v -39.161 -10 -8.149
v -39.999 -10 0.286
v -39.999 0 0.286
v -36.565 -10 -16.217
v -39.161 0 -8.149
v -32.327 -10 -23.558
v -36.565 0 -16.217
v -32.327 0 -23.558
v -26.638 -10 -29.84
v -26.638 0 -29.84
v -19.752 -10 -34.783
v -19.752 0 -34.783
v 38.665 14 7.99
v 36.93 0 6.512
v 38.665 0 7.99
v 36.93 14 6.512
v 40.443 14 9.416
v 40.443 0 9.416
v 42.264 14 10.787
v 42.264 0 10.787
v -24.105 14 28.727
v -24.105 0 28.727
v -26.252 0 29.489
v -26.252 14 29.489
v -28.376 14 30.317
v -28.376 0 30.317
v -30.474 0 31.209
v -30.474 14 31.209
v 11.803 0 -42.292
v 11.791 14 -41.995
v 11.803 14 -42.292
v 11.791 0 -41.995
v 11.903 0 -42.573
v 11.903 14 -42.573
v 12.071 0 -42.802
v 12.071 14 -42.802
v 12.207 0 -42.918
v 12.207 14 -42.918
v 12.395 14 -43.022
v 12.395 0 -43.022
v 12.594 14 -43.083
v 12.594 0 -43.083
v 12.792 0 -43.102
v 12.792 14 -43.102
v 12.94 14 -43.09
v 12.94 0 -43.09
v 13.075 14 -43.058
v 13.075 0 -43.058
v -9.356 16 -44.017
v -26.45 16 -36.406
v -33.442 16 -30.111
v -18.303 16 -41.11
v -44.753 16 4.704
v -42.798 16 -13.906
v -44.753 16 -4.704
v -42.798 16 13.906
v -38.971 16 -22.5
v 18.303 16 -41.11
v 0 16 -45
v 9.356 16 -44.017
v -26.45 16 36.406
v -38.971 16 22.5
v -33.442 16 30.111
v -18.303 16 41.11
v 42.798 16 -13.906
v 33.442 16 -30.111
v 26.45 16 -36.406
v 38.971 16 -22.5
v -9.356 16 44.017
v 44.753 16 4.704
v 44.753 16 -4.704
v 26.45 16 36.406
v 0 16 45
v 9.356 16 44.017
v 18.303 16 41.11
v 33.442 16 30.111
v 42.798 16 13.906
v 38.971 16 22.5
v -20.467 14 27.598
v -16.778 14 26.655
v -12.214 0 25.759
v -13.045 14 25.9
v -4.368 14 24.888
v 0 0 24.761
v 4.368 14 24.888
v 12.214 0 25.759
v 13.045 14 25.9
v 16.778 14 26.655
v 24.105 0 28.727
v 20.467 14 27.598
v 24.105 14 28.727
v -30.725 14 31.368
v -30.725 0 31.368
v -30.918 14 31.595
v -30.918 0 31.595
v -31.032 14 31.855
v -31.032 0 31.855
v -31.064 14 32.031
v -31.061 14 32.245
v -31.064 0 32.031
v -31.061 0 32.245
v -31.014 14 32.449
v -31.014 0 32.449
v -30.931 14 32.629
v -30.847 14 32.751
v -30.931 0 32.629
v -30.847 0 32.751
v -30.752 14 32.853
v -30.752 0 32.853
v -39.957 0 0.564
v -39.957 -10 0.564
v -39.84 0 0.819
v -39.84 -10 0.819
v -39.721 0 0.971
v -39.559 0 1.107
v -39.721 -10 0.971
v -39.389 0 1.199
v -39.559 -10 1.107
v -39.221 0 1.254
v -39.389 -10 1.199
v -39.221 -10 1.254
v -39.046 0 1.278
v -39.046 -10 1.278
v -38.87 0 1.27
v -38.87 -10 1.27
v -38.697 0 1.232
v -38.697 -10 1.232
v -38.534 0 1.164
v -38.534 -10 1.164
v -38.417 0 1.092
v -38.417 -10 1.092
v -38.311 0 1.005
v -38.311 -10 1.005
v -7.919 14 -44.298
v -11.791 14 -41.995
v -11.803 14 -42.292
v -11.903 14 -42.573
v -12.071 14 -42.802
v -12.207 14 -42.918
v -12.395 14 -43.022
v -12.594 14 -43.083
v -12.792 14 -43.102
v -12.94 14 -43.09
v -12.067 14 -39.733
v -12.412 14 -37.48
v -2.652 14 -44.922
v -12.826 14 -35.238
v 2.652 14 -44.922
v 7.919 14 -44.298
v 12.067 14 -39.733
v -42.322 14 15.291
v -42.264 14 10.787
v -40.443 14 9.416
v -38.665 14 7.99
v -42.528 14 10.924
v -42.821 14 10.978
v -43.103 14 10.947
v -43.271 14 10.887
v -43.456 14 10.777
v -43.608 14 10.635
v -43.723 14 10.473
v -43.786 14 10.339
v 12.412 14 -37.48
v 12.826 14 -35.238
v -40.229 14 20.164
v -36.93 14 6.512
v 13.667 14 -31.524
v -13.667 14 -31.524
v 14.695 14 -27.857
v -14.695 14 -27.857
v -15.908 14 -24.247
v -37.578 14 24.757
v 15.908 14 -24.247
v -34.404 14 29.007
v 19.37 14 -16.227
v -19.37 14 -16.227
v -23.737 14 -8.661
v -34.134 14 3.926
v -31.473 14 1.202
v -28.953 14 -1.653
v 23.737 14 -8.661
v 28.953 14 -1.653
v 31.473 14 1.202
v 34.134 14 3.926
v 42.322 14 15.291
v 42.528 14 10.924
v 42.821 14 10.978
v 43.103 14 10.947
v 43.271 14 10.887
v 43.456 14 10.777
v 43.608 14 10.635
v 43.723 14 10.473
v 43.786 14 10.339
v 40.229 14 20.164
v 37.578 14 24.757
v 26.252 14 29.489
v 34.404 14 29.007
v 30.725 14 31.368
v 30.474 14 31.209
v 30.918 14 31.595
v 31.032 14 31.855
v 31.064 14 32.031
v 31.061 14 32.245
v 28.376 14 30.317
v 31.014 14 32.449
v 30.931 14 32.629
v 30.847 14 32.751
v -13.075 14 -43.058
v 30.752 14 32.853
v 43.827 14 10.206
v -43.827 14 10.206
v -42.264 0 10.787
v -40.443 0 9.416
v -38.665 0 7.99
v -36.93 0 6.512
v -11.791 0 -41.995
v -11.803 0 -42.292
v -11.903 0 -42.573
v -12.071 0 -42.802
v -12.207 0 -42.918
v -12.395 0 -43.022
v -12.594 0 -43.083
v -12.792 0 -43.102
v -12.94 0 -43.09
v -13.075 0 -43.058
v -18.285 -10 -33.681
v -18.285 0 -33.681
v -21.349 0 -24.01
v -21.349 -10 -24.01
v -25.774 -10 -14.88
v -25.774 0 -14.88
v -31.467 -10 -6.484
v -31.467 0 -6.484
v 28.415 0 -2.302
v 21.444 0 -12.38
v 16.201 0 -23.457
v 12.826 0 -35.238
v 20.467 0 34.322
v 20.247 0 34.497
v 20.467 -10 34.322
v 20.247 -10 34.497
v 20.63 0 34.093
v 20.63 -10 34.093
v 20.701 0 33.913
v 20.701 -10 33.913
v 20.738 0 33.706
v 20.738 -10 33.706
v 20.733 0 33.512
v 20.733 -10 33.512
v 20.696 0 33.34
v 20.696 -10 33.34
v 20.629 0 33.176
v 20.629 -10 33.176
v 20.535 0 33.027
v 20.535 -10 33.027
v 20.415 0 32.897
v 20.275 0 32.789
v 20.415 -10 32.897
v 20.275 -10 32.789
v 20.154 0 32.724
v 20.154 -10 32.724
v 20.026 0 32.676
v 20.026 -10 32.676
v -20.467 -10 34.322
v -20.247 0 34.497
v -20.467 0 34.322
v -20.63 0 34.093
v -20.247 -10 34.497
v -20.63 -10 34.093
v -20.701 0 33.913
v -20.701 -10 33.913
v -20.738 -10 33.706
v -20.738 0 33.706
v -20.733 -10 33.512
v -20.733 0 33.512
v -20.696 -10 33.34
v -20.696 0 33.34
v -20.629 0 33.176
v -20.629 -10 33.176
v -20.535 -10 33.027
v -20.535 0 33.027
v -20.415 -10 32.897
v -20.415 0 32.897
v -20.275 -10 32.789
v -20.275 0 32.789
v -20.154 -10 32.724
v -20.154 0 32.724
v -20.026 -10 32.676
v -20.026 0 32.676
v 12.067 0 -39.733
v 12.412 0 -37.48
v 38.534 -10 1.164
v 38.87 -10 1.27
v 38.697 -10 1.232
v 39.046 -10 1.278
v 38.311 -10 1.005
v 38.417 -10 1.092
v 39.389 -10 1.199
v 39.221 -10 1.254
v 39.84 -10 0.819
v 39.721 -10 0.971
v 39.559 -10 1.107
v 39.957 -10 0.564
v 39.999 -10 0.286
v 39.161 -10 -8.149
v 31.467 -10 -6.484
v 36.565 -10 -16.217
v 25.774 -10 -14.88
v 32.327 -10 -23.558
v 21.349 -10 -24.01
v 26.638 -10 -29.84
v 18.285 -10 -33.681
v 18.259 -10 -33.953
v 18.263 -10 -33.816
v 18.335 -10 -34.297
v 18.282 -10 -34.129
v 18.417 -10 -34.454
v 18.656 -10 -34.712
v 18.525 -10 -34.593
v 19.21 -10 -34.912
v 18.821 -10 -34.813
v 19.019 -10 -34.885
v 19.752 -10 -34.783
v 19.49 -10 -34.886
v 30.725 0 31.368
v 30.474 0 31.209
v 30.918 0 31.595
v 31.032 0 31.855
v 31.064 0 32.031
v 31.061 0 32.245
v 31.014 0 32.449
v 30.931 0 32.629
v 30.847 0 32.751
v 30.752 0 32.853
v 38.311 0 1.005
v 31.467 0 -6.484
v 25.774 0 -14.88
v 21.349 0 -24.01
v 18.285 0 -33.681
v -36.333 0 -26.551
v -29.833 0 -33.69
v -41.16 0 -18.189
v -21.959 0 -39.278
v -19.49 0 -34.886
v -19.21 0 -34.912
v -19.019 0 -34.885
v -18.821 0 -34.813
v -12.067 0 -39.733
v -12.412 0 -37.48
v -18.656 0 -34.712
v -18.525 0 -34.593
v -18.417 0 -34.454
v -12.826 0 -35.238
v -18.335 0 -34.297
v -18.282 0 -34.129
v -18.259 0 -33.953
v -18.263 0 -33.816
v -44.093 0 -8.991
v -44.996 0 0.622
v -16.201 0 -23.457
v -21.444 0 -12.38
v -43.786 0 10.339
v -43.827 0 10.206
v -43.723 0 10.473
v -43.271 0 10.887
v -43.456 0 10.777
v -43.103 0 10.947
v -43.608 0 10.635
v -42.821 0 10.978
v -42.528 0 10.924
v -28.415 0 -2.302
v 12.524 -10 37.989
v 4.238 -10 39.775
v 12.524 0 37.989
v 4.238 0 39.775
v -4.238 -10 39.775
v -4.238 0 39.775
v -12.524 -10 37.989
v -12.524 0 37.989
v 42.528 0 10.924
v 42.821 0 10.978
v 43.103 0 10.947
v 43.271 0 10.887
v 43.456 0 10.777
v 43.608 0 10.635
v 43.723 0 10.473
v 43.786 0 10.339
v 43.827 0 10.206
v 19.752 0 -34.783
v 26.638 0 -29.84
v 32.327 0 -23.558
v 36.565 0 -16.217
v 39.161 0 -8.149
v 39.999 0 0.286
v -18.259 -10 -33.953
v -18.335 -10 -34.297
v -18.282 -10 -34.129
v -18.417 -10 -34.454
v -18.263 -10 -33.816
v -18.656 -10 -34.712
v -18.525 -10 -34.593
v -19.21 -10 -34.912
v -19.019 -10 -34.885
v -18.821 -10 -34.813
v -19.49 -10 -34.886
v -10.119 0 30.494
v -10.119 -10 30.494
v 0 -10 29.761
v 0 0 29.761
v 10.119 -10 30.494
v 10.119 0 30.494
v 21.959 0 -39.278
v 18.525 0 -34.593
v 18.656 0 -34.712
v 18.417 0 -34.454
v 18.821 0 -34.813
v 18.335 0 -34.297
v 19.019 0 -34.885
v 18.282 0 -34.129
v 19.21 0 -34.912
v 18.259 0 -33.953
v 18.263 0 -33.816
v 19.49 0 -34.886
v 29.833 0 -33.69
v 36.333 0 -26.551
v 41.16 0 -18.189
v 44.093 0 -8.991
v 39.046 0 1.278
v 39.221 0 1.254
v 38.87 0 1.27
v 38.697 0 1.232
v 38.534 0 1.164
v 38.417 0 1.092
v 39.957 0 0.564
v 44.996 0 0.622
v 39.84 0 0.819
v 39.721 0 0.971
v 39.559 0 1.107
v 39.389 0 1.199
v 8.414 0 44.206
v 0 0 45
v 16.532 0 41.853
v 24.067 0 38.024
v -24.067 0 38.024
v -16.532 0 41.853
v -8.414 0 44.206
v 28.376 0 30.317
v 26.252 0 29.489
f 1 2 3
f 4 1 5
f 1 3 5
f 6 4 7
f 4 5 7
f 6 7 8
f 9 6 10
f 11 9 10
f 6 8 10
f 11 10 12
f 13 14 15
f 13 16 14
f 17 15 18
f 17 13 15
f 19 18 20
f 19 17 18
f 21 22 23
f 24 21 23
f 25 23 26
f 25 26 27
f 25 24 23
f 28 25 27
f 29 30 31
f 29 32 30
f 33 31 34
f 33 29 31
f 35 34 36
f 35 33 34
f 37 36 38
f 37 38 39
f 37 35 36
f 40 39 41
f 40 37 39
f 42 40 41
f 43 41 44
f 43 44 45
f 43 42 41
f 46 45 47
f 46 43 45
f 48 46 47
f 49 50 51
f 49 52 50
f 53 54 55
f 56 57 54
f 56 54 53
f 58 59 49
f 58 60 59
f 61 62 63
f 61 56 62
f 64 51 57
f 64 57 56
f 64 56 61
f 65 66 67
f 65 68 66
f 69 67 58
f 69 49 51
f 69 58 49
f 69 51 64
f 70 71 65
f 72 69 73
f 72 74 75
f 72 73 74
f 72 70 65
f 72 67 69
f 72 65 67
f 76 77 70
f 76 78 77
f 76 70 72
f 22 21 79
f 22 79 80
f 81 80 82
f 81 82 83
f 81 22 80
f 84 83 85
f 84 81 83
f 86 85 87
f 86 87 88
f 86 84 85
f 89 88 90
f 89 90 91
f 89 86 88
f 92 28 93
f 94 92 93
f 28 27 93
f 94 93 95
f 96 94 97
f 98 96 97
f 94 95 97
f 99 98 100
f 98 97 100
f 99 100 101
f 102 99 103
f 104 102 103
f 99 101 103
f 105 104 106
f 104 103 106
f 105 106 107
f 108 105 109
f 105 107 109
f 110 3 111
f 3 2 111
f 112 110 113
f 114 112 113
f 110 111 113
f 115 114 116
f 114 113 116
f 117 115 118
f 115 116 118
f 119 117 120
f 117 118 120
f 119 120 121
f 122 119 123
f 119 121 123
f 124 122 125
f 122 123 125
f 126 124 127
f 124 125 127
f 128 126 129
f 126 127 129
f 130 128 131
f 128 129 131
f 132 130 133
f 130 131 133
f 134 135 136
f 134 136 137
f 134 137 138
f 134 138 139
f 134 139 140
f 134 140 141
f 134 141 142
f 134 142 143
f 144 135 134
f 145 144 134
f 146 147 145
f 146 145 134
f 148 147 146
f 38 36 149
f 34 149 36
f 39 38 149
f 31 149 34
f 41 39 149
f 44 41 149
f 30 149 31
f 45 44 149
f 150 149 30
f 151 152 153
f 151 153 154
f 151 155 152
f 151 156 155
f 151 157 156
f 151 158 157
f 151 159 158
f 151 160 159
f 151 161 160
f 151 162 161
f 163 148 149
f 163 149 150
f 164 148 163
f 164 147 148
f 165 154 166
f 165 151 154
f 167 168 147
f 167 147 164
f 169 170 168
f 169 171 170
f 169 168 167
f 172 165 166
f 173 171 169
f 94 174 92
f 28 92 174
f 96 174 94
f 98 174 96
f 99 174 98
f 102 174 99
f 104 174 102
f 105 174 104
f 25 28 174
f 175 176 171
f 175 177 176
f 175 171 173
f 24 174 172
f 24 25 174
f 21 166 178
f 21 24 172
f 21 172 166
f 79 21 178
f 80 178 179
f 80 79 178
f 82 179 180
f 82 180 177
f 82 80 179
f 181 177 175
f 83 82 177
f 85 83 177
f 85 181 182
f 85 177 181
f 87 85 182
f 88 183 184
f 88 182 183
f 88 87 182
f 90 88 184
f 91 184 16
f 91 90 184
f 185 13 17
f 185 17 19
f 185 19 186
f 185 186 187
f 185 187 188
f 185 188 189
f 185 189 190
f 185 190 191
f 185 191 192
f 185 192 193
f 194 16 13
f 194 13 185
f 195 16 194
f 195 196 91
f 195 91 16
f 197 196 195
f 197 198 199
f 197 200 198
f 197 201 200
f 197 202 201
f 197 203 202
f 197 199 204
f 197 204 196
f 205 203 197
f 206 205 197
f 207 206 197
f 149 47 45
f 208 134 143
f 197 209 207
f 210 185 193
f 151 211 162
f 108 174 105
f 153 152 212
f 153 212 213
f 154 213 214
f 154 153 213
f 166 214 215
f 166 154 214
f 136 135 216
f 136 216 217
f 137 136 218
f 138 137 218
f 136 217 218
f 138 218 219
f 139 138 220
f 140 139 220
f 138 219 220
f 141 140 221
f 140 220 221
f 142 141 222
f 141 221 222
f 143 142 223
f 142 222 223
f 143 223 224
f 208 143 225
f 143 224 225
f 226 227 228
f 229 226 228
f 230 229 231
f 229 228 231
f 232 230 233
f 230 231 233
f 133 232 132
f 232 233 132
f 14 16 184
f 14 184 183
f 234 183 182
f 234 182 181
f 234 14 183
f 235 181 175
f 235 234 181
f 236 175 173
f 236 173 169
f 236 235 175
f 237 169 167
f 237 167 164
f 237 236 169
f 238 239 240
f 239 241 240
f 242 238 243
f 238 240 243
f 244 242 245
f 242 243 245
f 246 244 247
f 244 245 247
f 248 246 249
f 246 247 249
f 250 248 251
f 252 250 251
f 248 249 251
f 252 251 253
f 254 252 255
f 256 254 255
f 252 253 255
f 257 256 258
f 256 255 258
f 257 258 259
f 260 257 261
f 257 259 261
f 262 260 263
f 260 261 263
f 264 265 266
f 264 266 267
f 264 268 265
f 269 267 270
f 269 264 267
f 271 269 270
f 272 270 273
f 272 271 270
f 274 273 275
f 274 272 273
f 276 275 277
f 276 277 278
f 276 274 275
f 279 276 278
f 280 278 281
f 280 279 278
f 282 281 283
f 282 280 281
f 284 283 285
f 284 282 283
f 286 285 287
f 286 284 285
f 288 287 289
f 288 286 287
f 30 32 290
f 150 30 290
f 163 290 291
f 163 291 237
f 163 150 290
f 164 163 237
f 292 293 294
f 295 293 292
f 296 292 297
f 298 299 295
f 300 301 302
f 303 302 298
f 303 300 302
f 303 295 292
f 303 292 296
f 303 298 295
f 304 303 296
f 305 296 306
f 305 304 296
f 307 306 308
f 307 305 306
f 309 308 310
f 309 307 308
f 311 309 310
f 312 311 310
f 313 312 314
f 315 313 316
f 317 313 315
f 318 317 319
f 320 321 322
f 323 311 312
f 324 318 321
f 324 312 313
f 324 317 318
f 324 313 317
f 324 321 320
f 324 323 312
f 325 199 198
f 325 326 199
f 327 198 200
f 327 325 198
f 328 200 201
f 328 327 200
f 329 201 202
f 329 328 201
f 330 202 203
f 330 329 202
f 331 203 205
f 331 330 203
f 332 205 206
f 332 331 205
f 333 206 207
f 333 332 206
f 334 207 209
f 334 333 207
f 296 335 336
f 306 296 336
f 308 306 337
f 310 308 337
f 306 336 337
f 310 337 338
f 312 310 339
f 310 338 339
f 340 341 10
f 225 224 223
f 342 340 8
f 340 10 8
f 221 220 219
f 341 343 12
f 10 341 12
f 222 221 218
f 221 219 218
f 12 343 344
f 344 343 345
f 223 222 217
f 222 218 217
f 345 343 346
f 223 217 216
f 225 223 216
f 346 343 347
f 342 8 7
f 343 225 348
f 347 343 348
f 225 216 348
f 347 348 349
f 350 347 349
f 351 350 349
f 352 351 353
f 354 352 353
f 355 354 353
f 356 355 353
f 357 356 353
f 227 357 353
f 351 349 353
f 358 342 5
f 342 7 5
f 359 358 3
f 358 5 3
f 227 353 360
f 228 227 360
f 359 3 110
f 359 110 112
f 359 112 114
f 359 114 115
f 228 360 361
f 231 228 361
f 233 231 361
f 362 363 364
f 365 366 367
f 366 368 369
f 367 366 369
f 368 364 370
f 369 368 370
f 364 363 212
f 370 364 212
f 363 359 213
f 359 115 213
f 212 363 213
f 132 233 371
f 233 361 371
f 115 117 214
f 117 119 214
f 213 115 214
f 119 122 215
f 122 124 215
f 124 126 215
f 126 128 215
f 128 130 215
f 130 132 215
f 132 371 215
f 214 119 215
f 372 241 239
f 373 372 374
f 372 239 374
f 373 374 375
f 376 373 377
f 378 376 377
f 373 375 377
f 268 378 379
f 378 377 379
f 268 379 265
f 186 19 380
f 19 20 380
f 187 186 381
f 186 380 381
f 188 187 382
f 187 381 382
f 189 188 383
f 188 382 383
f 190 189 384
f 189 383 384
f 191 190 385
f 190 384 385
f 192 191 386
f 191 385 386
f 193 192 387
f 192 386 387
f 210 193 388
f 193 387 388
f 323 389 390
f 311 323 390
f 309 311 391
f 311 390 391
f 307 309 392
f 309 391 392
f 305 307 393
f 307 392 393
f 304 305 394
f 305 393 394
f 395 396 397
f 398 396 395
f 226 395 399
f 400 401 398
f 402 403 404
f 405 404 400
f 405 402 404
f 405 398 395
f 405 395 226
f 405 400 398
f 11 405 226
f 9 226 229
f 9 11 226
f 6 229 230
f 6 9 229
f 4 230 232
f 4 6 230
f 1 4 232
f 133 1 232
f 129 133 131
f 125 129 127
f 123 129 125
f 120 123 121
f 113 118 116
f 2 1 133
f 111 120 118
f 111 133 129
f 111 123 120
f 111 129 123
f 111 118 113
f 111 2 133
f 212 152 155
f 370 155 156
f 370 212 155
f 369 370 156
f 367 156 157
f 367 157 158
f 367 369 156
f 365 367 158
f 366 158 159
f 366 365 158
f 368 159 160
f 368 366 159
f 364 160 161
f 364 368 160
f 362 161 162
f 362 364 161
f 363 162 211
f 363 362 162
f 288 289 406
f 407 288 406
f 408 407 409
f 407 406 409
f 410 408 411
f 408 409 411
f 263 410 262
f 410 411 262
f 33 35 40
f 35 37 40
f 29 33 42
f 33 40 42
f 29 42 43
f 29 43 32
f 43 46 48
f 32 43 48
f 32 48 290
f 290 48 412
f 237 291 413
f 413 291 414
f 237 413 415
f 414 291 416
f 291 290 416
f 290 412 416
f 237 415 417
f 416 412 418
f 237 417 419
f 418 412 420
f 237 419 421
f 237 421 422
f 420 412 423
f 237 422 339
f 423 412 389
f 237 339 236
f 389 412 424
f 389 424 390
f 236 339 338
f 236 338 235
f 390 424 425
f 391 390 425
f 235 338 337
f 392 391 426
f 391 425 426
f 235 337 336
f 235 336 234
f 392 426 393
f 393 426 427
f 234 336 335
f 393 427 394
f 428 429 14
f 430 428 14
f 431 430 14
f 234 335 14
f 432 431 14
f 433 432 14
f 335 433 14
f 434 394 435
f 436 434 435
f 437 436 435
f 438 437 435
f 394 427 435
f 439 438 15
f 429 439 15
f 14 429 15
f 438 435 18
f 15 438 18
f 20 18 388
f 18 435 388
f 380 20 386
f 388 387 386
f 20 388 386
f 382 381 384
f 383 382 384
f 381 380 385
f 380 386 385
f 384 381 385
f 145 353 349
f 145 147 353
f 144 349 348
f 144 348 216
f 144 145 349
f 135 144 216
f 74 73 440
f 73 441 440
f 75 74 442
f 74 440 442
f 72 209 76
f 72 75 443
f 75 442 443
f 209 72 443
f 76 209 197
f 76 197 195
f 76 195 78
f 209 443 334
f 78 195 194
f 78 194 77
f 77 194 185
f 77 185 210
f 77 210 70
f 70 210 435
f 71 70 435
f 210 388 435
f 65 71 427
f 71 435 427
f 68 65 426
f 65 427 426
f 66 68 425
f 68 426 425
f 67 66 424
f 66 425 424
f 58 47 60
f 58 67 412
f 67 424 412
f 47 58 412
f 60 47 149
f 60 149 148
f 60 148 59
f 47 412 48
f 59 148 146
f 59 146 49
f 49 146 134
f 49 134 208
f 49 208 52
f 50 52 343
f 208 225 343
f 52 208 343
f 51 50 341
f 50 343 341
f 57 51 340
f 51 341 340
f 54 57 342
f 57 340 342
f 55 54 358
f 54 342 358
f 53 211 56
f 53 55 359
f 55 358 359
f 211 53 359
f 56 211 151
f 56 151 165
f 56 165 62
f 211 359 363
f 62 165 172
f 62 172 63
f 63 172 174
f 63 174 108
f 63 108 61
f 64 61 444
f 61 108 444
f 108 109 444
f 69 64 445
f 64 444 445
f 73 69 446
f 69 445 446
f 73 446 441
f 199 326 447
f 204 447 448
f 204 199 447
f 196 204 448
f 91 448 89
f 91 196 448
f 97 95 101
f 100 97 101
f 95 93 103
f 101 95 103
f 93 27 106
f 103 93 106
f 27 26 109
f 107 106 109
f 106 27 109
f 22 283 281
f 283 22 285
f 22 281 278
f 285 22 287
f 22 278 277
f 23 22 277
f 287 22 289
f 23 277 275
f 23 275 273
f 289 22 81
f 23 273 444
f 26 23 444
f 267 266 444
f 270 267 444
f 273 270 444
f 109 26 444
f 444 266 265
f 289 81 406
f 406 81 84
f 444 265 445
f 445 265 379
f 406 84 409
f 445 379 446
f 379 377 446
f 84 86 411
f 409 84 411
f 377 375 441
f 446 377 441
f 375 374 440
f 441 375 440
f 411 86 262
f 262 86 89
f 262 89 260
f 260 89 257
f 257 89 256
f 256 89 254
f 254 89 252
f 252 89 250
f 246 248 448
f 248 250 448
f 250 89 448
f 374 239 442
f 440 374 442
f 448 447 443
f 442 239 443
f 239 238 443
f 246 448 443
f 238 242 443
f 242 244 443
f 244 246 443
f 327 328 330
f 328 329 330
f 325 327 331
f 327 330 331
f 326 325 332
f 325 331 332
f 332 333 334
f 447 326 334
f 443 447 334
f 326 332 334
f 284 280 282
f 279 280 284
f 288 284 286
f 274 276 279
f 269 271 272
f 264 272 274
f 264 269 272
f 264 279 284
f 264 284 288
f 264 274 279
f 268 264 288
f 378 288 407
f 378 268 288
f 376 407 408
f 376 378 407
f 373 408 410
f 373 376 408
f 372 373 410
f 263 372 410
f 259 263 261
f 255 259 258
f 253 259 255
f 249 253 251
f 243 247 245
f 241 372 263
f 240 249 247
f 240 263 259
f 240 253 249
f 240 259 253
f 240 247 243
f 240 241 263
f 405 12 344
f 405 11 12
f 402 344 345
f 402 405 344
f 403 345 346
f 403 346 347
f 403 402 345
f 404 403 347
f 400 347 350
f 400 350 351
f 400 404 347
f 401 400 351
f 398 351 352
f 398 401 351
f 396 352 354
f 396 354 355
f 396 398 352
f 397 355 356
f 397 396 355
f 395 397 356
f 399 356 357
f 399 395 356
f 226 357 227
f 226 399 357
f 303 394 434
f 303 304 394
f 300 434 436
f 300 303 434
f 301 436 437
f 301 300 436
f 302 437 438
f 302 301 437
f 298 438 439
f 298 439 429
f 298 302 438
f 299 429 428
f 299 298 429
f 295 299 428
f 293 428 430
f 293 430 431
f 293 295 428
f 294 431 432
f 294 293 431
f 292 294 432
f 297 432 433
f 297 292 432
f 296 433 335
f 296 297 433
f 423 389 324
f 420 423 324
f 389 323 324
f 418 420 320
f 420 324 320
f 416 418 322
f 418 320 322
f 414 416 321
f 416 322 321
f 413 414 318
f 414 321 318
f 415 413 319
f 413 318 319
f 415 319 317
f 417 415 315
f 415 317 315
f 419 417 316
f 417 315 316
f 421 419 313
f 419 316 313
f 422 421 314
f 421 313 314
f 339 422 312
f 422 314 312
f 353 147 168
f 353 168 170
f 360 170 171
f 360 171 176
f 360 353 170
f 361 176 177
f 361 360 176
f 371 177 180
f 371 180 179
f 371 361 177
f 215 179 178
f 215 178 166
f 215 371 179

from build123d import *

# Parameters (mm, degrees)
SKETCH1_R                = 37.5
BOSS_EXTRUDE1_DEPTH      = 14
CUT_EXTRUDE2_START       = -14
CUT_EXTRUDE2_DEPTH       = 14
SKETCH4_R                = 45
SKETCH4_R_2              = 37.5
BOSS_EXTRUDE2_DEPTH      = 14
SKETCH6_R                = 45
BOSS_EXTRUDE3_DEPTH      = 2
SKETCH7_R                = 1.75
CUT_EXTRUDE3_DEPTH       = 66.620118866
CIRPATTERN2_COUNT        = 3
BOSS_EXTRUDE4_DEPTH      = 10
FILLET1_R                = 1
CIRPATTERN3_COUNT        = 3
FILLET1_OF_CIRPATTERN3_R = 1
CUT_EXTRUDE4_DEPTH       = 69.01470446
FILLET2_R                = 1
SKETCH15_R               = 45
BOSS_EXTRUDE5_DEPTH      = 2


# Read off the part's stored shape, not the designer's step: Cut-Extrude2
with BuildPart() as part:
    # Sketch1 → Boss-Extrude1 (new body)
    with BuildSketch(Plane(origin=(0, 0, 0), x_dir=(1, 0, 0), z_dir=(0, 1, 0))):
        with Locations(Location((0, 0, 0), (0, 0, 270))):
            Circle(SKETCH1_R)
    extrude(amount=BOSS_EXTRUDE1_DEPTH)

    # Cut-Extrude2 outline → Cut-Extrude2 (cut)
    with BuildSketch(Plane(origin=(0, 14, 0), x_dir=(1, 0, 0), z_dir=(0, 1, 0)).offset(CUT_EXTRUDE2_START)):
        with BuildLine():
            ThreePointArc((-24.104535363, -28.726666617), (0, -24.760936498), (24.104535363, -28.726666617))
            ThreePointArc((24.104535363, -28.726666617), (32.475952642, -18.75), (36.930290738, -6.511806663))
            ThreePointArc((36.930290738, -6.511806663), (21.443600029, 12.380468249), (12.825755375, 35.238473279))
            ThreePointArc((12.825755375, 35.238473279), (0, 37.5), (-12.825755375, 35.238473279))
            ThreePointArc((-12.825755375, 35.238473279), (-21.443600029, 12.380468249), (-36.930290738, -6.511806663))
            ThreePointArc((-36.930290738, -6.511806663), (-32.475952642, -18.75), (-24.104535363, -28.726666617))
        make_face()
    extrude(amount=CUT_EXTRUDE2_DEPTH, mode=Mode.SUBTRACT)

    # Sketch4 → Boss-Extrude2 (add)
    with BuildSketch(Plane(origin=(0, 0, 0), x_dir=(1, 0, 0), z_dir=(0, 1, 0))):
        with Locations(Location((0, 0, 0), (0, 0, 270))):
            Circle(SKETCH4_R)
        Circle(SKETCH4_R_2, mode=Mode.SUBTRACT)
    extrude(amount=BOSS_EXTRUDE2_DEPTH)

    # Sketch6 → Boss-Extrude3 (add)
    with BuildSketch(Plane(origin=(0, 14, 0), x_dir=(1, 0, 0), z_dir=(0, 1, 0))):
        with Locations(Location((0, 0, 0), (0, 0, 270))):
            Circle(SKETCH6_R)
        with BuildLine():
            ThreePointArc((-28.952849653, 1.653026611), (-25.11473671, -14.5), (-13.044861788, -25.900416617))
            ThreePointArc((-13.044861788, -25.900416617), (0, -24.760936498), (13.044861788, -25.900416617))
            ThreePointArc((13.044861788, -25.900416617), (25.11473671, -14.5), (28.952849653, 1.653026611))
            ThreePointArc((28.952849653, 1.653026611), (21.443600029, 12.380468249), (15.907987865, 24.247390006))
            ThreePointArc((15.907987865, 24.247390006), (0, 29), (-15.907987865, 24.247390006))
            ThreePointArc((-15.907987865, 24.247390006), (-21.443600029, 12.380468249), (-28.952849653, 1.653026611))
        make_face(mode=Mode.SUBTRACT)
    extrude(amount=BOSS_EXTRUDE3_DEPTH)

    # Sketch7 → Cut-Extrude3 (cut, through all)
    with BuildSketch(Plane(origin=(0, 16, 0), x_dir=(1, 0, 0), z_dir=(0, 1, 0))):
        with Locations(Location((0, 32, 0), (0, 0, 270))):
            Circle(SKETCH7_R)
    cut_extrude3 = extrude(amount=-CUT_EXTRUDE3_DEPTH, mode=Mode.SUBTRACT)

    # CirPattern2: Cut-Extrude3 ×3 about axis
    cirpattern2_axis = Axis((0, 0, 0), (0, 1, 0))
    for i in range(1, CIRPATTERN2_COUNT):
        add(cut_extrude3.rotate(cirpattern2_axis, i * 360 / CIRPATTERN2_COUNT), mode=Mode.SUBTRACT)

    # Sketch13 → Boss-Extrude4 (add)
    with BuildSketch(Plane.XZ):
        with BuildLine():
            ThreePointArc((-22.11228446, 33.332369792), (0, 29.760936498), (22.11228446, 33.332369792))
            ThreePointArc((22.11228446, 33.332369792), (0, 40), (-22.11228446, 33.332369792))
        make_face()
    boss_extrude4 = extrude(amount=BOSS_EXTRUDE4_DEPTH)

    # Fillet1
    fillet1_edges = [part.edges().sort_by_distance(p)[0] for p in [
        (22.11228446, -5, 33.332369792),
        (-22.11228446, -5, 33.332369792),
    ]]
    fillet(fillet1_edges, radius=FILLET1_R)

    # CirPattern3: Boss-Extrude4 ×3 about axis
    cirpattern3_axis = Axis((0, 0, 0), (0, 1, 0))
    for i in range(1, CIRPATTERN3_COUNT):
        add(boss_extrude4.rotate(cirpattern3_axis, i * 360 / CIRPATTERN3_COUNT))

    # Fillet1 of CirPattern3
    fillet1_of_cirpattern3_edges = [part.edges().sort_by_distance(p)[0] for p in [
        (17.810536778, -5, -35.815984974),
        (39.922821238, -5, 2.483615182),
        (-39.922821238, -5, 2.483615182),
        (-17.810536778, -5, -35.815984974),
    ]]
    fillet(fillet1_of_cirpattern3_edges, radius=FILLET1_OF_CIRPATTERN3_R)

    # Sketch14 → Cut-Extrude4 (cut, through all)
    with BuildSketch(Plane.XZ.offset(-14)):
        with BuildLine():
            Line((-33.206244265, 32.485097805), (-44.736042076, 12.514902195))
            ThreePointArc((-44.736042076, 12.514902195), (-21.443600029, -12.380468249), (-11.529797811, -45))
            Line((-11.529797811, -45), (11.529797811, -45))
            ThreePointArc((11.529797811, -45), (21.443600029, -12.380468249), (44.736042076, 12.514902195))
            Line((44.736042076, 12.514902195), (33.206244265, 32.485097805))
            ThreePointArc((33.206244265, 32.485097805), (0, 24.760936498), (-33.206244265, 32.485097805))
        make_face()
    extrude(amount=CUT_EXTRUDE4_DEPTH, mode=Mode.SUBTRACT)

    # Fillet2
    fillet2_edges = [part.edges().sort_by_distance(p)[0] for p in [
        (43.466885988, 7, 11.646021745),
        (11.64769231, 7, -43.466438362),
        (-31.819193678, 7, 31.820416617),
        (31.819193678, 7, 31.820416617),
        (-11.64769231, 7, -43.466438362),
        (-43.466885988, 7, 11.646021745),
    ]]
    fillet(fillet2_edges, radius=FILLET2_R)

    # Sketch15 → Boss-Extrude5 (add)
    with BuildSketch(Plane.XZ.offset(-14)):
        with Locations(Location((0, 0, 0), (0, 0, 253.108257002))):
            Circle(SKETCH15_R)
    extrude(amount=-BOSS_EXTRUDE5_DEPTH)


solid = part.part
